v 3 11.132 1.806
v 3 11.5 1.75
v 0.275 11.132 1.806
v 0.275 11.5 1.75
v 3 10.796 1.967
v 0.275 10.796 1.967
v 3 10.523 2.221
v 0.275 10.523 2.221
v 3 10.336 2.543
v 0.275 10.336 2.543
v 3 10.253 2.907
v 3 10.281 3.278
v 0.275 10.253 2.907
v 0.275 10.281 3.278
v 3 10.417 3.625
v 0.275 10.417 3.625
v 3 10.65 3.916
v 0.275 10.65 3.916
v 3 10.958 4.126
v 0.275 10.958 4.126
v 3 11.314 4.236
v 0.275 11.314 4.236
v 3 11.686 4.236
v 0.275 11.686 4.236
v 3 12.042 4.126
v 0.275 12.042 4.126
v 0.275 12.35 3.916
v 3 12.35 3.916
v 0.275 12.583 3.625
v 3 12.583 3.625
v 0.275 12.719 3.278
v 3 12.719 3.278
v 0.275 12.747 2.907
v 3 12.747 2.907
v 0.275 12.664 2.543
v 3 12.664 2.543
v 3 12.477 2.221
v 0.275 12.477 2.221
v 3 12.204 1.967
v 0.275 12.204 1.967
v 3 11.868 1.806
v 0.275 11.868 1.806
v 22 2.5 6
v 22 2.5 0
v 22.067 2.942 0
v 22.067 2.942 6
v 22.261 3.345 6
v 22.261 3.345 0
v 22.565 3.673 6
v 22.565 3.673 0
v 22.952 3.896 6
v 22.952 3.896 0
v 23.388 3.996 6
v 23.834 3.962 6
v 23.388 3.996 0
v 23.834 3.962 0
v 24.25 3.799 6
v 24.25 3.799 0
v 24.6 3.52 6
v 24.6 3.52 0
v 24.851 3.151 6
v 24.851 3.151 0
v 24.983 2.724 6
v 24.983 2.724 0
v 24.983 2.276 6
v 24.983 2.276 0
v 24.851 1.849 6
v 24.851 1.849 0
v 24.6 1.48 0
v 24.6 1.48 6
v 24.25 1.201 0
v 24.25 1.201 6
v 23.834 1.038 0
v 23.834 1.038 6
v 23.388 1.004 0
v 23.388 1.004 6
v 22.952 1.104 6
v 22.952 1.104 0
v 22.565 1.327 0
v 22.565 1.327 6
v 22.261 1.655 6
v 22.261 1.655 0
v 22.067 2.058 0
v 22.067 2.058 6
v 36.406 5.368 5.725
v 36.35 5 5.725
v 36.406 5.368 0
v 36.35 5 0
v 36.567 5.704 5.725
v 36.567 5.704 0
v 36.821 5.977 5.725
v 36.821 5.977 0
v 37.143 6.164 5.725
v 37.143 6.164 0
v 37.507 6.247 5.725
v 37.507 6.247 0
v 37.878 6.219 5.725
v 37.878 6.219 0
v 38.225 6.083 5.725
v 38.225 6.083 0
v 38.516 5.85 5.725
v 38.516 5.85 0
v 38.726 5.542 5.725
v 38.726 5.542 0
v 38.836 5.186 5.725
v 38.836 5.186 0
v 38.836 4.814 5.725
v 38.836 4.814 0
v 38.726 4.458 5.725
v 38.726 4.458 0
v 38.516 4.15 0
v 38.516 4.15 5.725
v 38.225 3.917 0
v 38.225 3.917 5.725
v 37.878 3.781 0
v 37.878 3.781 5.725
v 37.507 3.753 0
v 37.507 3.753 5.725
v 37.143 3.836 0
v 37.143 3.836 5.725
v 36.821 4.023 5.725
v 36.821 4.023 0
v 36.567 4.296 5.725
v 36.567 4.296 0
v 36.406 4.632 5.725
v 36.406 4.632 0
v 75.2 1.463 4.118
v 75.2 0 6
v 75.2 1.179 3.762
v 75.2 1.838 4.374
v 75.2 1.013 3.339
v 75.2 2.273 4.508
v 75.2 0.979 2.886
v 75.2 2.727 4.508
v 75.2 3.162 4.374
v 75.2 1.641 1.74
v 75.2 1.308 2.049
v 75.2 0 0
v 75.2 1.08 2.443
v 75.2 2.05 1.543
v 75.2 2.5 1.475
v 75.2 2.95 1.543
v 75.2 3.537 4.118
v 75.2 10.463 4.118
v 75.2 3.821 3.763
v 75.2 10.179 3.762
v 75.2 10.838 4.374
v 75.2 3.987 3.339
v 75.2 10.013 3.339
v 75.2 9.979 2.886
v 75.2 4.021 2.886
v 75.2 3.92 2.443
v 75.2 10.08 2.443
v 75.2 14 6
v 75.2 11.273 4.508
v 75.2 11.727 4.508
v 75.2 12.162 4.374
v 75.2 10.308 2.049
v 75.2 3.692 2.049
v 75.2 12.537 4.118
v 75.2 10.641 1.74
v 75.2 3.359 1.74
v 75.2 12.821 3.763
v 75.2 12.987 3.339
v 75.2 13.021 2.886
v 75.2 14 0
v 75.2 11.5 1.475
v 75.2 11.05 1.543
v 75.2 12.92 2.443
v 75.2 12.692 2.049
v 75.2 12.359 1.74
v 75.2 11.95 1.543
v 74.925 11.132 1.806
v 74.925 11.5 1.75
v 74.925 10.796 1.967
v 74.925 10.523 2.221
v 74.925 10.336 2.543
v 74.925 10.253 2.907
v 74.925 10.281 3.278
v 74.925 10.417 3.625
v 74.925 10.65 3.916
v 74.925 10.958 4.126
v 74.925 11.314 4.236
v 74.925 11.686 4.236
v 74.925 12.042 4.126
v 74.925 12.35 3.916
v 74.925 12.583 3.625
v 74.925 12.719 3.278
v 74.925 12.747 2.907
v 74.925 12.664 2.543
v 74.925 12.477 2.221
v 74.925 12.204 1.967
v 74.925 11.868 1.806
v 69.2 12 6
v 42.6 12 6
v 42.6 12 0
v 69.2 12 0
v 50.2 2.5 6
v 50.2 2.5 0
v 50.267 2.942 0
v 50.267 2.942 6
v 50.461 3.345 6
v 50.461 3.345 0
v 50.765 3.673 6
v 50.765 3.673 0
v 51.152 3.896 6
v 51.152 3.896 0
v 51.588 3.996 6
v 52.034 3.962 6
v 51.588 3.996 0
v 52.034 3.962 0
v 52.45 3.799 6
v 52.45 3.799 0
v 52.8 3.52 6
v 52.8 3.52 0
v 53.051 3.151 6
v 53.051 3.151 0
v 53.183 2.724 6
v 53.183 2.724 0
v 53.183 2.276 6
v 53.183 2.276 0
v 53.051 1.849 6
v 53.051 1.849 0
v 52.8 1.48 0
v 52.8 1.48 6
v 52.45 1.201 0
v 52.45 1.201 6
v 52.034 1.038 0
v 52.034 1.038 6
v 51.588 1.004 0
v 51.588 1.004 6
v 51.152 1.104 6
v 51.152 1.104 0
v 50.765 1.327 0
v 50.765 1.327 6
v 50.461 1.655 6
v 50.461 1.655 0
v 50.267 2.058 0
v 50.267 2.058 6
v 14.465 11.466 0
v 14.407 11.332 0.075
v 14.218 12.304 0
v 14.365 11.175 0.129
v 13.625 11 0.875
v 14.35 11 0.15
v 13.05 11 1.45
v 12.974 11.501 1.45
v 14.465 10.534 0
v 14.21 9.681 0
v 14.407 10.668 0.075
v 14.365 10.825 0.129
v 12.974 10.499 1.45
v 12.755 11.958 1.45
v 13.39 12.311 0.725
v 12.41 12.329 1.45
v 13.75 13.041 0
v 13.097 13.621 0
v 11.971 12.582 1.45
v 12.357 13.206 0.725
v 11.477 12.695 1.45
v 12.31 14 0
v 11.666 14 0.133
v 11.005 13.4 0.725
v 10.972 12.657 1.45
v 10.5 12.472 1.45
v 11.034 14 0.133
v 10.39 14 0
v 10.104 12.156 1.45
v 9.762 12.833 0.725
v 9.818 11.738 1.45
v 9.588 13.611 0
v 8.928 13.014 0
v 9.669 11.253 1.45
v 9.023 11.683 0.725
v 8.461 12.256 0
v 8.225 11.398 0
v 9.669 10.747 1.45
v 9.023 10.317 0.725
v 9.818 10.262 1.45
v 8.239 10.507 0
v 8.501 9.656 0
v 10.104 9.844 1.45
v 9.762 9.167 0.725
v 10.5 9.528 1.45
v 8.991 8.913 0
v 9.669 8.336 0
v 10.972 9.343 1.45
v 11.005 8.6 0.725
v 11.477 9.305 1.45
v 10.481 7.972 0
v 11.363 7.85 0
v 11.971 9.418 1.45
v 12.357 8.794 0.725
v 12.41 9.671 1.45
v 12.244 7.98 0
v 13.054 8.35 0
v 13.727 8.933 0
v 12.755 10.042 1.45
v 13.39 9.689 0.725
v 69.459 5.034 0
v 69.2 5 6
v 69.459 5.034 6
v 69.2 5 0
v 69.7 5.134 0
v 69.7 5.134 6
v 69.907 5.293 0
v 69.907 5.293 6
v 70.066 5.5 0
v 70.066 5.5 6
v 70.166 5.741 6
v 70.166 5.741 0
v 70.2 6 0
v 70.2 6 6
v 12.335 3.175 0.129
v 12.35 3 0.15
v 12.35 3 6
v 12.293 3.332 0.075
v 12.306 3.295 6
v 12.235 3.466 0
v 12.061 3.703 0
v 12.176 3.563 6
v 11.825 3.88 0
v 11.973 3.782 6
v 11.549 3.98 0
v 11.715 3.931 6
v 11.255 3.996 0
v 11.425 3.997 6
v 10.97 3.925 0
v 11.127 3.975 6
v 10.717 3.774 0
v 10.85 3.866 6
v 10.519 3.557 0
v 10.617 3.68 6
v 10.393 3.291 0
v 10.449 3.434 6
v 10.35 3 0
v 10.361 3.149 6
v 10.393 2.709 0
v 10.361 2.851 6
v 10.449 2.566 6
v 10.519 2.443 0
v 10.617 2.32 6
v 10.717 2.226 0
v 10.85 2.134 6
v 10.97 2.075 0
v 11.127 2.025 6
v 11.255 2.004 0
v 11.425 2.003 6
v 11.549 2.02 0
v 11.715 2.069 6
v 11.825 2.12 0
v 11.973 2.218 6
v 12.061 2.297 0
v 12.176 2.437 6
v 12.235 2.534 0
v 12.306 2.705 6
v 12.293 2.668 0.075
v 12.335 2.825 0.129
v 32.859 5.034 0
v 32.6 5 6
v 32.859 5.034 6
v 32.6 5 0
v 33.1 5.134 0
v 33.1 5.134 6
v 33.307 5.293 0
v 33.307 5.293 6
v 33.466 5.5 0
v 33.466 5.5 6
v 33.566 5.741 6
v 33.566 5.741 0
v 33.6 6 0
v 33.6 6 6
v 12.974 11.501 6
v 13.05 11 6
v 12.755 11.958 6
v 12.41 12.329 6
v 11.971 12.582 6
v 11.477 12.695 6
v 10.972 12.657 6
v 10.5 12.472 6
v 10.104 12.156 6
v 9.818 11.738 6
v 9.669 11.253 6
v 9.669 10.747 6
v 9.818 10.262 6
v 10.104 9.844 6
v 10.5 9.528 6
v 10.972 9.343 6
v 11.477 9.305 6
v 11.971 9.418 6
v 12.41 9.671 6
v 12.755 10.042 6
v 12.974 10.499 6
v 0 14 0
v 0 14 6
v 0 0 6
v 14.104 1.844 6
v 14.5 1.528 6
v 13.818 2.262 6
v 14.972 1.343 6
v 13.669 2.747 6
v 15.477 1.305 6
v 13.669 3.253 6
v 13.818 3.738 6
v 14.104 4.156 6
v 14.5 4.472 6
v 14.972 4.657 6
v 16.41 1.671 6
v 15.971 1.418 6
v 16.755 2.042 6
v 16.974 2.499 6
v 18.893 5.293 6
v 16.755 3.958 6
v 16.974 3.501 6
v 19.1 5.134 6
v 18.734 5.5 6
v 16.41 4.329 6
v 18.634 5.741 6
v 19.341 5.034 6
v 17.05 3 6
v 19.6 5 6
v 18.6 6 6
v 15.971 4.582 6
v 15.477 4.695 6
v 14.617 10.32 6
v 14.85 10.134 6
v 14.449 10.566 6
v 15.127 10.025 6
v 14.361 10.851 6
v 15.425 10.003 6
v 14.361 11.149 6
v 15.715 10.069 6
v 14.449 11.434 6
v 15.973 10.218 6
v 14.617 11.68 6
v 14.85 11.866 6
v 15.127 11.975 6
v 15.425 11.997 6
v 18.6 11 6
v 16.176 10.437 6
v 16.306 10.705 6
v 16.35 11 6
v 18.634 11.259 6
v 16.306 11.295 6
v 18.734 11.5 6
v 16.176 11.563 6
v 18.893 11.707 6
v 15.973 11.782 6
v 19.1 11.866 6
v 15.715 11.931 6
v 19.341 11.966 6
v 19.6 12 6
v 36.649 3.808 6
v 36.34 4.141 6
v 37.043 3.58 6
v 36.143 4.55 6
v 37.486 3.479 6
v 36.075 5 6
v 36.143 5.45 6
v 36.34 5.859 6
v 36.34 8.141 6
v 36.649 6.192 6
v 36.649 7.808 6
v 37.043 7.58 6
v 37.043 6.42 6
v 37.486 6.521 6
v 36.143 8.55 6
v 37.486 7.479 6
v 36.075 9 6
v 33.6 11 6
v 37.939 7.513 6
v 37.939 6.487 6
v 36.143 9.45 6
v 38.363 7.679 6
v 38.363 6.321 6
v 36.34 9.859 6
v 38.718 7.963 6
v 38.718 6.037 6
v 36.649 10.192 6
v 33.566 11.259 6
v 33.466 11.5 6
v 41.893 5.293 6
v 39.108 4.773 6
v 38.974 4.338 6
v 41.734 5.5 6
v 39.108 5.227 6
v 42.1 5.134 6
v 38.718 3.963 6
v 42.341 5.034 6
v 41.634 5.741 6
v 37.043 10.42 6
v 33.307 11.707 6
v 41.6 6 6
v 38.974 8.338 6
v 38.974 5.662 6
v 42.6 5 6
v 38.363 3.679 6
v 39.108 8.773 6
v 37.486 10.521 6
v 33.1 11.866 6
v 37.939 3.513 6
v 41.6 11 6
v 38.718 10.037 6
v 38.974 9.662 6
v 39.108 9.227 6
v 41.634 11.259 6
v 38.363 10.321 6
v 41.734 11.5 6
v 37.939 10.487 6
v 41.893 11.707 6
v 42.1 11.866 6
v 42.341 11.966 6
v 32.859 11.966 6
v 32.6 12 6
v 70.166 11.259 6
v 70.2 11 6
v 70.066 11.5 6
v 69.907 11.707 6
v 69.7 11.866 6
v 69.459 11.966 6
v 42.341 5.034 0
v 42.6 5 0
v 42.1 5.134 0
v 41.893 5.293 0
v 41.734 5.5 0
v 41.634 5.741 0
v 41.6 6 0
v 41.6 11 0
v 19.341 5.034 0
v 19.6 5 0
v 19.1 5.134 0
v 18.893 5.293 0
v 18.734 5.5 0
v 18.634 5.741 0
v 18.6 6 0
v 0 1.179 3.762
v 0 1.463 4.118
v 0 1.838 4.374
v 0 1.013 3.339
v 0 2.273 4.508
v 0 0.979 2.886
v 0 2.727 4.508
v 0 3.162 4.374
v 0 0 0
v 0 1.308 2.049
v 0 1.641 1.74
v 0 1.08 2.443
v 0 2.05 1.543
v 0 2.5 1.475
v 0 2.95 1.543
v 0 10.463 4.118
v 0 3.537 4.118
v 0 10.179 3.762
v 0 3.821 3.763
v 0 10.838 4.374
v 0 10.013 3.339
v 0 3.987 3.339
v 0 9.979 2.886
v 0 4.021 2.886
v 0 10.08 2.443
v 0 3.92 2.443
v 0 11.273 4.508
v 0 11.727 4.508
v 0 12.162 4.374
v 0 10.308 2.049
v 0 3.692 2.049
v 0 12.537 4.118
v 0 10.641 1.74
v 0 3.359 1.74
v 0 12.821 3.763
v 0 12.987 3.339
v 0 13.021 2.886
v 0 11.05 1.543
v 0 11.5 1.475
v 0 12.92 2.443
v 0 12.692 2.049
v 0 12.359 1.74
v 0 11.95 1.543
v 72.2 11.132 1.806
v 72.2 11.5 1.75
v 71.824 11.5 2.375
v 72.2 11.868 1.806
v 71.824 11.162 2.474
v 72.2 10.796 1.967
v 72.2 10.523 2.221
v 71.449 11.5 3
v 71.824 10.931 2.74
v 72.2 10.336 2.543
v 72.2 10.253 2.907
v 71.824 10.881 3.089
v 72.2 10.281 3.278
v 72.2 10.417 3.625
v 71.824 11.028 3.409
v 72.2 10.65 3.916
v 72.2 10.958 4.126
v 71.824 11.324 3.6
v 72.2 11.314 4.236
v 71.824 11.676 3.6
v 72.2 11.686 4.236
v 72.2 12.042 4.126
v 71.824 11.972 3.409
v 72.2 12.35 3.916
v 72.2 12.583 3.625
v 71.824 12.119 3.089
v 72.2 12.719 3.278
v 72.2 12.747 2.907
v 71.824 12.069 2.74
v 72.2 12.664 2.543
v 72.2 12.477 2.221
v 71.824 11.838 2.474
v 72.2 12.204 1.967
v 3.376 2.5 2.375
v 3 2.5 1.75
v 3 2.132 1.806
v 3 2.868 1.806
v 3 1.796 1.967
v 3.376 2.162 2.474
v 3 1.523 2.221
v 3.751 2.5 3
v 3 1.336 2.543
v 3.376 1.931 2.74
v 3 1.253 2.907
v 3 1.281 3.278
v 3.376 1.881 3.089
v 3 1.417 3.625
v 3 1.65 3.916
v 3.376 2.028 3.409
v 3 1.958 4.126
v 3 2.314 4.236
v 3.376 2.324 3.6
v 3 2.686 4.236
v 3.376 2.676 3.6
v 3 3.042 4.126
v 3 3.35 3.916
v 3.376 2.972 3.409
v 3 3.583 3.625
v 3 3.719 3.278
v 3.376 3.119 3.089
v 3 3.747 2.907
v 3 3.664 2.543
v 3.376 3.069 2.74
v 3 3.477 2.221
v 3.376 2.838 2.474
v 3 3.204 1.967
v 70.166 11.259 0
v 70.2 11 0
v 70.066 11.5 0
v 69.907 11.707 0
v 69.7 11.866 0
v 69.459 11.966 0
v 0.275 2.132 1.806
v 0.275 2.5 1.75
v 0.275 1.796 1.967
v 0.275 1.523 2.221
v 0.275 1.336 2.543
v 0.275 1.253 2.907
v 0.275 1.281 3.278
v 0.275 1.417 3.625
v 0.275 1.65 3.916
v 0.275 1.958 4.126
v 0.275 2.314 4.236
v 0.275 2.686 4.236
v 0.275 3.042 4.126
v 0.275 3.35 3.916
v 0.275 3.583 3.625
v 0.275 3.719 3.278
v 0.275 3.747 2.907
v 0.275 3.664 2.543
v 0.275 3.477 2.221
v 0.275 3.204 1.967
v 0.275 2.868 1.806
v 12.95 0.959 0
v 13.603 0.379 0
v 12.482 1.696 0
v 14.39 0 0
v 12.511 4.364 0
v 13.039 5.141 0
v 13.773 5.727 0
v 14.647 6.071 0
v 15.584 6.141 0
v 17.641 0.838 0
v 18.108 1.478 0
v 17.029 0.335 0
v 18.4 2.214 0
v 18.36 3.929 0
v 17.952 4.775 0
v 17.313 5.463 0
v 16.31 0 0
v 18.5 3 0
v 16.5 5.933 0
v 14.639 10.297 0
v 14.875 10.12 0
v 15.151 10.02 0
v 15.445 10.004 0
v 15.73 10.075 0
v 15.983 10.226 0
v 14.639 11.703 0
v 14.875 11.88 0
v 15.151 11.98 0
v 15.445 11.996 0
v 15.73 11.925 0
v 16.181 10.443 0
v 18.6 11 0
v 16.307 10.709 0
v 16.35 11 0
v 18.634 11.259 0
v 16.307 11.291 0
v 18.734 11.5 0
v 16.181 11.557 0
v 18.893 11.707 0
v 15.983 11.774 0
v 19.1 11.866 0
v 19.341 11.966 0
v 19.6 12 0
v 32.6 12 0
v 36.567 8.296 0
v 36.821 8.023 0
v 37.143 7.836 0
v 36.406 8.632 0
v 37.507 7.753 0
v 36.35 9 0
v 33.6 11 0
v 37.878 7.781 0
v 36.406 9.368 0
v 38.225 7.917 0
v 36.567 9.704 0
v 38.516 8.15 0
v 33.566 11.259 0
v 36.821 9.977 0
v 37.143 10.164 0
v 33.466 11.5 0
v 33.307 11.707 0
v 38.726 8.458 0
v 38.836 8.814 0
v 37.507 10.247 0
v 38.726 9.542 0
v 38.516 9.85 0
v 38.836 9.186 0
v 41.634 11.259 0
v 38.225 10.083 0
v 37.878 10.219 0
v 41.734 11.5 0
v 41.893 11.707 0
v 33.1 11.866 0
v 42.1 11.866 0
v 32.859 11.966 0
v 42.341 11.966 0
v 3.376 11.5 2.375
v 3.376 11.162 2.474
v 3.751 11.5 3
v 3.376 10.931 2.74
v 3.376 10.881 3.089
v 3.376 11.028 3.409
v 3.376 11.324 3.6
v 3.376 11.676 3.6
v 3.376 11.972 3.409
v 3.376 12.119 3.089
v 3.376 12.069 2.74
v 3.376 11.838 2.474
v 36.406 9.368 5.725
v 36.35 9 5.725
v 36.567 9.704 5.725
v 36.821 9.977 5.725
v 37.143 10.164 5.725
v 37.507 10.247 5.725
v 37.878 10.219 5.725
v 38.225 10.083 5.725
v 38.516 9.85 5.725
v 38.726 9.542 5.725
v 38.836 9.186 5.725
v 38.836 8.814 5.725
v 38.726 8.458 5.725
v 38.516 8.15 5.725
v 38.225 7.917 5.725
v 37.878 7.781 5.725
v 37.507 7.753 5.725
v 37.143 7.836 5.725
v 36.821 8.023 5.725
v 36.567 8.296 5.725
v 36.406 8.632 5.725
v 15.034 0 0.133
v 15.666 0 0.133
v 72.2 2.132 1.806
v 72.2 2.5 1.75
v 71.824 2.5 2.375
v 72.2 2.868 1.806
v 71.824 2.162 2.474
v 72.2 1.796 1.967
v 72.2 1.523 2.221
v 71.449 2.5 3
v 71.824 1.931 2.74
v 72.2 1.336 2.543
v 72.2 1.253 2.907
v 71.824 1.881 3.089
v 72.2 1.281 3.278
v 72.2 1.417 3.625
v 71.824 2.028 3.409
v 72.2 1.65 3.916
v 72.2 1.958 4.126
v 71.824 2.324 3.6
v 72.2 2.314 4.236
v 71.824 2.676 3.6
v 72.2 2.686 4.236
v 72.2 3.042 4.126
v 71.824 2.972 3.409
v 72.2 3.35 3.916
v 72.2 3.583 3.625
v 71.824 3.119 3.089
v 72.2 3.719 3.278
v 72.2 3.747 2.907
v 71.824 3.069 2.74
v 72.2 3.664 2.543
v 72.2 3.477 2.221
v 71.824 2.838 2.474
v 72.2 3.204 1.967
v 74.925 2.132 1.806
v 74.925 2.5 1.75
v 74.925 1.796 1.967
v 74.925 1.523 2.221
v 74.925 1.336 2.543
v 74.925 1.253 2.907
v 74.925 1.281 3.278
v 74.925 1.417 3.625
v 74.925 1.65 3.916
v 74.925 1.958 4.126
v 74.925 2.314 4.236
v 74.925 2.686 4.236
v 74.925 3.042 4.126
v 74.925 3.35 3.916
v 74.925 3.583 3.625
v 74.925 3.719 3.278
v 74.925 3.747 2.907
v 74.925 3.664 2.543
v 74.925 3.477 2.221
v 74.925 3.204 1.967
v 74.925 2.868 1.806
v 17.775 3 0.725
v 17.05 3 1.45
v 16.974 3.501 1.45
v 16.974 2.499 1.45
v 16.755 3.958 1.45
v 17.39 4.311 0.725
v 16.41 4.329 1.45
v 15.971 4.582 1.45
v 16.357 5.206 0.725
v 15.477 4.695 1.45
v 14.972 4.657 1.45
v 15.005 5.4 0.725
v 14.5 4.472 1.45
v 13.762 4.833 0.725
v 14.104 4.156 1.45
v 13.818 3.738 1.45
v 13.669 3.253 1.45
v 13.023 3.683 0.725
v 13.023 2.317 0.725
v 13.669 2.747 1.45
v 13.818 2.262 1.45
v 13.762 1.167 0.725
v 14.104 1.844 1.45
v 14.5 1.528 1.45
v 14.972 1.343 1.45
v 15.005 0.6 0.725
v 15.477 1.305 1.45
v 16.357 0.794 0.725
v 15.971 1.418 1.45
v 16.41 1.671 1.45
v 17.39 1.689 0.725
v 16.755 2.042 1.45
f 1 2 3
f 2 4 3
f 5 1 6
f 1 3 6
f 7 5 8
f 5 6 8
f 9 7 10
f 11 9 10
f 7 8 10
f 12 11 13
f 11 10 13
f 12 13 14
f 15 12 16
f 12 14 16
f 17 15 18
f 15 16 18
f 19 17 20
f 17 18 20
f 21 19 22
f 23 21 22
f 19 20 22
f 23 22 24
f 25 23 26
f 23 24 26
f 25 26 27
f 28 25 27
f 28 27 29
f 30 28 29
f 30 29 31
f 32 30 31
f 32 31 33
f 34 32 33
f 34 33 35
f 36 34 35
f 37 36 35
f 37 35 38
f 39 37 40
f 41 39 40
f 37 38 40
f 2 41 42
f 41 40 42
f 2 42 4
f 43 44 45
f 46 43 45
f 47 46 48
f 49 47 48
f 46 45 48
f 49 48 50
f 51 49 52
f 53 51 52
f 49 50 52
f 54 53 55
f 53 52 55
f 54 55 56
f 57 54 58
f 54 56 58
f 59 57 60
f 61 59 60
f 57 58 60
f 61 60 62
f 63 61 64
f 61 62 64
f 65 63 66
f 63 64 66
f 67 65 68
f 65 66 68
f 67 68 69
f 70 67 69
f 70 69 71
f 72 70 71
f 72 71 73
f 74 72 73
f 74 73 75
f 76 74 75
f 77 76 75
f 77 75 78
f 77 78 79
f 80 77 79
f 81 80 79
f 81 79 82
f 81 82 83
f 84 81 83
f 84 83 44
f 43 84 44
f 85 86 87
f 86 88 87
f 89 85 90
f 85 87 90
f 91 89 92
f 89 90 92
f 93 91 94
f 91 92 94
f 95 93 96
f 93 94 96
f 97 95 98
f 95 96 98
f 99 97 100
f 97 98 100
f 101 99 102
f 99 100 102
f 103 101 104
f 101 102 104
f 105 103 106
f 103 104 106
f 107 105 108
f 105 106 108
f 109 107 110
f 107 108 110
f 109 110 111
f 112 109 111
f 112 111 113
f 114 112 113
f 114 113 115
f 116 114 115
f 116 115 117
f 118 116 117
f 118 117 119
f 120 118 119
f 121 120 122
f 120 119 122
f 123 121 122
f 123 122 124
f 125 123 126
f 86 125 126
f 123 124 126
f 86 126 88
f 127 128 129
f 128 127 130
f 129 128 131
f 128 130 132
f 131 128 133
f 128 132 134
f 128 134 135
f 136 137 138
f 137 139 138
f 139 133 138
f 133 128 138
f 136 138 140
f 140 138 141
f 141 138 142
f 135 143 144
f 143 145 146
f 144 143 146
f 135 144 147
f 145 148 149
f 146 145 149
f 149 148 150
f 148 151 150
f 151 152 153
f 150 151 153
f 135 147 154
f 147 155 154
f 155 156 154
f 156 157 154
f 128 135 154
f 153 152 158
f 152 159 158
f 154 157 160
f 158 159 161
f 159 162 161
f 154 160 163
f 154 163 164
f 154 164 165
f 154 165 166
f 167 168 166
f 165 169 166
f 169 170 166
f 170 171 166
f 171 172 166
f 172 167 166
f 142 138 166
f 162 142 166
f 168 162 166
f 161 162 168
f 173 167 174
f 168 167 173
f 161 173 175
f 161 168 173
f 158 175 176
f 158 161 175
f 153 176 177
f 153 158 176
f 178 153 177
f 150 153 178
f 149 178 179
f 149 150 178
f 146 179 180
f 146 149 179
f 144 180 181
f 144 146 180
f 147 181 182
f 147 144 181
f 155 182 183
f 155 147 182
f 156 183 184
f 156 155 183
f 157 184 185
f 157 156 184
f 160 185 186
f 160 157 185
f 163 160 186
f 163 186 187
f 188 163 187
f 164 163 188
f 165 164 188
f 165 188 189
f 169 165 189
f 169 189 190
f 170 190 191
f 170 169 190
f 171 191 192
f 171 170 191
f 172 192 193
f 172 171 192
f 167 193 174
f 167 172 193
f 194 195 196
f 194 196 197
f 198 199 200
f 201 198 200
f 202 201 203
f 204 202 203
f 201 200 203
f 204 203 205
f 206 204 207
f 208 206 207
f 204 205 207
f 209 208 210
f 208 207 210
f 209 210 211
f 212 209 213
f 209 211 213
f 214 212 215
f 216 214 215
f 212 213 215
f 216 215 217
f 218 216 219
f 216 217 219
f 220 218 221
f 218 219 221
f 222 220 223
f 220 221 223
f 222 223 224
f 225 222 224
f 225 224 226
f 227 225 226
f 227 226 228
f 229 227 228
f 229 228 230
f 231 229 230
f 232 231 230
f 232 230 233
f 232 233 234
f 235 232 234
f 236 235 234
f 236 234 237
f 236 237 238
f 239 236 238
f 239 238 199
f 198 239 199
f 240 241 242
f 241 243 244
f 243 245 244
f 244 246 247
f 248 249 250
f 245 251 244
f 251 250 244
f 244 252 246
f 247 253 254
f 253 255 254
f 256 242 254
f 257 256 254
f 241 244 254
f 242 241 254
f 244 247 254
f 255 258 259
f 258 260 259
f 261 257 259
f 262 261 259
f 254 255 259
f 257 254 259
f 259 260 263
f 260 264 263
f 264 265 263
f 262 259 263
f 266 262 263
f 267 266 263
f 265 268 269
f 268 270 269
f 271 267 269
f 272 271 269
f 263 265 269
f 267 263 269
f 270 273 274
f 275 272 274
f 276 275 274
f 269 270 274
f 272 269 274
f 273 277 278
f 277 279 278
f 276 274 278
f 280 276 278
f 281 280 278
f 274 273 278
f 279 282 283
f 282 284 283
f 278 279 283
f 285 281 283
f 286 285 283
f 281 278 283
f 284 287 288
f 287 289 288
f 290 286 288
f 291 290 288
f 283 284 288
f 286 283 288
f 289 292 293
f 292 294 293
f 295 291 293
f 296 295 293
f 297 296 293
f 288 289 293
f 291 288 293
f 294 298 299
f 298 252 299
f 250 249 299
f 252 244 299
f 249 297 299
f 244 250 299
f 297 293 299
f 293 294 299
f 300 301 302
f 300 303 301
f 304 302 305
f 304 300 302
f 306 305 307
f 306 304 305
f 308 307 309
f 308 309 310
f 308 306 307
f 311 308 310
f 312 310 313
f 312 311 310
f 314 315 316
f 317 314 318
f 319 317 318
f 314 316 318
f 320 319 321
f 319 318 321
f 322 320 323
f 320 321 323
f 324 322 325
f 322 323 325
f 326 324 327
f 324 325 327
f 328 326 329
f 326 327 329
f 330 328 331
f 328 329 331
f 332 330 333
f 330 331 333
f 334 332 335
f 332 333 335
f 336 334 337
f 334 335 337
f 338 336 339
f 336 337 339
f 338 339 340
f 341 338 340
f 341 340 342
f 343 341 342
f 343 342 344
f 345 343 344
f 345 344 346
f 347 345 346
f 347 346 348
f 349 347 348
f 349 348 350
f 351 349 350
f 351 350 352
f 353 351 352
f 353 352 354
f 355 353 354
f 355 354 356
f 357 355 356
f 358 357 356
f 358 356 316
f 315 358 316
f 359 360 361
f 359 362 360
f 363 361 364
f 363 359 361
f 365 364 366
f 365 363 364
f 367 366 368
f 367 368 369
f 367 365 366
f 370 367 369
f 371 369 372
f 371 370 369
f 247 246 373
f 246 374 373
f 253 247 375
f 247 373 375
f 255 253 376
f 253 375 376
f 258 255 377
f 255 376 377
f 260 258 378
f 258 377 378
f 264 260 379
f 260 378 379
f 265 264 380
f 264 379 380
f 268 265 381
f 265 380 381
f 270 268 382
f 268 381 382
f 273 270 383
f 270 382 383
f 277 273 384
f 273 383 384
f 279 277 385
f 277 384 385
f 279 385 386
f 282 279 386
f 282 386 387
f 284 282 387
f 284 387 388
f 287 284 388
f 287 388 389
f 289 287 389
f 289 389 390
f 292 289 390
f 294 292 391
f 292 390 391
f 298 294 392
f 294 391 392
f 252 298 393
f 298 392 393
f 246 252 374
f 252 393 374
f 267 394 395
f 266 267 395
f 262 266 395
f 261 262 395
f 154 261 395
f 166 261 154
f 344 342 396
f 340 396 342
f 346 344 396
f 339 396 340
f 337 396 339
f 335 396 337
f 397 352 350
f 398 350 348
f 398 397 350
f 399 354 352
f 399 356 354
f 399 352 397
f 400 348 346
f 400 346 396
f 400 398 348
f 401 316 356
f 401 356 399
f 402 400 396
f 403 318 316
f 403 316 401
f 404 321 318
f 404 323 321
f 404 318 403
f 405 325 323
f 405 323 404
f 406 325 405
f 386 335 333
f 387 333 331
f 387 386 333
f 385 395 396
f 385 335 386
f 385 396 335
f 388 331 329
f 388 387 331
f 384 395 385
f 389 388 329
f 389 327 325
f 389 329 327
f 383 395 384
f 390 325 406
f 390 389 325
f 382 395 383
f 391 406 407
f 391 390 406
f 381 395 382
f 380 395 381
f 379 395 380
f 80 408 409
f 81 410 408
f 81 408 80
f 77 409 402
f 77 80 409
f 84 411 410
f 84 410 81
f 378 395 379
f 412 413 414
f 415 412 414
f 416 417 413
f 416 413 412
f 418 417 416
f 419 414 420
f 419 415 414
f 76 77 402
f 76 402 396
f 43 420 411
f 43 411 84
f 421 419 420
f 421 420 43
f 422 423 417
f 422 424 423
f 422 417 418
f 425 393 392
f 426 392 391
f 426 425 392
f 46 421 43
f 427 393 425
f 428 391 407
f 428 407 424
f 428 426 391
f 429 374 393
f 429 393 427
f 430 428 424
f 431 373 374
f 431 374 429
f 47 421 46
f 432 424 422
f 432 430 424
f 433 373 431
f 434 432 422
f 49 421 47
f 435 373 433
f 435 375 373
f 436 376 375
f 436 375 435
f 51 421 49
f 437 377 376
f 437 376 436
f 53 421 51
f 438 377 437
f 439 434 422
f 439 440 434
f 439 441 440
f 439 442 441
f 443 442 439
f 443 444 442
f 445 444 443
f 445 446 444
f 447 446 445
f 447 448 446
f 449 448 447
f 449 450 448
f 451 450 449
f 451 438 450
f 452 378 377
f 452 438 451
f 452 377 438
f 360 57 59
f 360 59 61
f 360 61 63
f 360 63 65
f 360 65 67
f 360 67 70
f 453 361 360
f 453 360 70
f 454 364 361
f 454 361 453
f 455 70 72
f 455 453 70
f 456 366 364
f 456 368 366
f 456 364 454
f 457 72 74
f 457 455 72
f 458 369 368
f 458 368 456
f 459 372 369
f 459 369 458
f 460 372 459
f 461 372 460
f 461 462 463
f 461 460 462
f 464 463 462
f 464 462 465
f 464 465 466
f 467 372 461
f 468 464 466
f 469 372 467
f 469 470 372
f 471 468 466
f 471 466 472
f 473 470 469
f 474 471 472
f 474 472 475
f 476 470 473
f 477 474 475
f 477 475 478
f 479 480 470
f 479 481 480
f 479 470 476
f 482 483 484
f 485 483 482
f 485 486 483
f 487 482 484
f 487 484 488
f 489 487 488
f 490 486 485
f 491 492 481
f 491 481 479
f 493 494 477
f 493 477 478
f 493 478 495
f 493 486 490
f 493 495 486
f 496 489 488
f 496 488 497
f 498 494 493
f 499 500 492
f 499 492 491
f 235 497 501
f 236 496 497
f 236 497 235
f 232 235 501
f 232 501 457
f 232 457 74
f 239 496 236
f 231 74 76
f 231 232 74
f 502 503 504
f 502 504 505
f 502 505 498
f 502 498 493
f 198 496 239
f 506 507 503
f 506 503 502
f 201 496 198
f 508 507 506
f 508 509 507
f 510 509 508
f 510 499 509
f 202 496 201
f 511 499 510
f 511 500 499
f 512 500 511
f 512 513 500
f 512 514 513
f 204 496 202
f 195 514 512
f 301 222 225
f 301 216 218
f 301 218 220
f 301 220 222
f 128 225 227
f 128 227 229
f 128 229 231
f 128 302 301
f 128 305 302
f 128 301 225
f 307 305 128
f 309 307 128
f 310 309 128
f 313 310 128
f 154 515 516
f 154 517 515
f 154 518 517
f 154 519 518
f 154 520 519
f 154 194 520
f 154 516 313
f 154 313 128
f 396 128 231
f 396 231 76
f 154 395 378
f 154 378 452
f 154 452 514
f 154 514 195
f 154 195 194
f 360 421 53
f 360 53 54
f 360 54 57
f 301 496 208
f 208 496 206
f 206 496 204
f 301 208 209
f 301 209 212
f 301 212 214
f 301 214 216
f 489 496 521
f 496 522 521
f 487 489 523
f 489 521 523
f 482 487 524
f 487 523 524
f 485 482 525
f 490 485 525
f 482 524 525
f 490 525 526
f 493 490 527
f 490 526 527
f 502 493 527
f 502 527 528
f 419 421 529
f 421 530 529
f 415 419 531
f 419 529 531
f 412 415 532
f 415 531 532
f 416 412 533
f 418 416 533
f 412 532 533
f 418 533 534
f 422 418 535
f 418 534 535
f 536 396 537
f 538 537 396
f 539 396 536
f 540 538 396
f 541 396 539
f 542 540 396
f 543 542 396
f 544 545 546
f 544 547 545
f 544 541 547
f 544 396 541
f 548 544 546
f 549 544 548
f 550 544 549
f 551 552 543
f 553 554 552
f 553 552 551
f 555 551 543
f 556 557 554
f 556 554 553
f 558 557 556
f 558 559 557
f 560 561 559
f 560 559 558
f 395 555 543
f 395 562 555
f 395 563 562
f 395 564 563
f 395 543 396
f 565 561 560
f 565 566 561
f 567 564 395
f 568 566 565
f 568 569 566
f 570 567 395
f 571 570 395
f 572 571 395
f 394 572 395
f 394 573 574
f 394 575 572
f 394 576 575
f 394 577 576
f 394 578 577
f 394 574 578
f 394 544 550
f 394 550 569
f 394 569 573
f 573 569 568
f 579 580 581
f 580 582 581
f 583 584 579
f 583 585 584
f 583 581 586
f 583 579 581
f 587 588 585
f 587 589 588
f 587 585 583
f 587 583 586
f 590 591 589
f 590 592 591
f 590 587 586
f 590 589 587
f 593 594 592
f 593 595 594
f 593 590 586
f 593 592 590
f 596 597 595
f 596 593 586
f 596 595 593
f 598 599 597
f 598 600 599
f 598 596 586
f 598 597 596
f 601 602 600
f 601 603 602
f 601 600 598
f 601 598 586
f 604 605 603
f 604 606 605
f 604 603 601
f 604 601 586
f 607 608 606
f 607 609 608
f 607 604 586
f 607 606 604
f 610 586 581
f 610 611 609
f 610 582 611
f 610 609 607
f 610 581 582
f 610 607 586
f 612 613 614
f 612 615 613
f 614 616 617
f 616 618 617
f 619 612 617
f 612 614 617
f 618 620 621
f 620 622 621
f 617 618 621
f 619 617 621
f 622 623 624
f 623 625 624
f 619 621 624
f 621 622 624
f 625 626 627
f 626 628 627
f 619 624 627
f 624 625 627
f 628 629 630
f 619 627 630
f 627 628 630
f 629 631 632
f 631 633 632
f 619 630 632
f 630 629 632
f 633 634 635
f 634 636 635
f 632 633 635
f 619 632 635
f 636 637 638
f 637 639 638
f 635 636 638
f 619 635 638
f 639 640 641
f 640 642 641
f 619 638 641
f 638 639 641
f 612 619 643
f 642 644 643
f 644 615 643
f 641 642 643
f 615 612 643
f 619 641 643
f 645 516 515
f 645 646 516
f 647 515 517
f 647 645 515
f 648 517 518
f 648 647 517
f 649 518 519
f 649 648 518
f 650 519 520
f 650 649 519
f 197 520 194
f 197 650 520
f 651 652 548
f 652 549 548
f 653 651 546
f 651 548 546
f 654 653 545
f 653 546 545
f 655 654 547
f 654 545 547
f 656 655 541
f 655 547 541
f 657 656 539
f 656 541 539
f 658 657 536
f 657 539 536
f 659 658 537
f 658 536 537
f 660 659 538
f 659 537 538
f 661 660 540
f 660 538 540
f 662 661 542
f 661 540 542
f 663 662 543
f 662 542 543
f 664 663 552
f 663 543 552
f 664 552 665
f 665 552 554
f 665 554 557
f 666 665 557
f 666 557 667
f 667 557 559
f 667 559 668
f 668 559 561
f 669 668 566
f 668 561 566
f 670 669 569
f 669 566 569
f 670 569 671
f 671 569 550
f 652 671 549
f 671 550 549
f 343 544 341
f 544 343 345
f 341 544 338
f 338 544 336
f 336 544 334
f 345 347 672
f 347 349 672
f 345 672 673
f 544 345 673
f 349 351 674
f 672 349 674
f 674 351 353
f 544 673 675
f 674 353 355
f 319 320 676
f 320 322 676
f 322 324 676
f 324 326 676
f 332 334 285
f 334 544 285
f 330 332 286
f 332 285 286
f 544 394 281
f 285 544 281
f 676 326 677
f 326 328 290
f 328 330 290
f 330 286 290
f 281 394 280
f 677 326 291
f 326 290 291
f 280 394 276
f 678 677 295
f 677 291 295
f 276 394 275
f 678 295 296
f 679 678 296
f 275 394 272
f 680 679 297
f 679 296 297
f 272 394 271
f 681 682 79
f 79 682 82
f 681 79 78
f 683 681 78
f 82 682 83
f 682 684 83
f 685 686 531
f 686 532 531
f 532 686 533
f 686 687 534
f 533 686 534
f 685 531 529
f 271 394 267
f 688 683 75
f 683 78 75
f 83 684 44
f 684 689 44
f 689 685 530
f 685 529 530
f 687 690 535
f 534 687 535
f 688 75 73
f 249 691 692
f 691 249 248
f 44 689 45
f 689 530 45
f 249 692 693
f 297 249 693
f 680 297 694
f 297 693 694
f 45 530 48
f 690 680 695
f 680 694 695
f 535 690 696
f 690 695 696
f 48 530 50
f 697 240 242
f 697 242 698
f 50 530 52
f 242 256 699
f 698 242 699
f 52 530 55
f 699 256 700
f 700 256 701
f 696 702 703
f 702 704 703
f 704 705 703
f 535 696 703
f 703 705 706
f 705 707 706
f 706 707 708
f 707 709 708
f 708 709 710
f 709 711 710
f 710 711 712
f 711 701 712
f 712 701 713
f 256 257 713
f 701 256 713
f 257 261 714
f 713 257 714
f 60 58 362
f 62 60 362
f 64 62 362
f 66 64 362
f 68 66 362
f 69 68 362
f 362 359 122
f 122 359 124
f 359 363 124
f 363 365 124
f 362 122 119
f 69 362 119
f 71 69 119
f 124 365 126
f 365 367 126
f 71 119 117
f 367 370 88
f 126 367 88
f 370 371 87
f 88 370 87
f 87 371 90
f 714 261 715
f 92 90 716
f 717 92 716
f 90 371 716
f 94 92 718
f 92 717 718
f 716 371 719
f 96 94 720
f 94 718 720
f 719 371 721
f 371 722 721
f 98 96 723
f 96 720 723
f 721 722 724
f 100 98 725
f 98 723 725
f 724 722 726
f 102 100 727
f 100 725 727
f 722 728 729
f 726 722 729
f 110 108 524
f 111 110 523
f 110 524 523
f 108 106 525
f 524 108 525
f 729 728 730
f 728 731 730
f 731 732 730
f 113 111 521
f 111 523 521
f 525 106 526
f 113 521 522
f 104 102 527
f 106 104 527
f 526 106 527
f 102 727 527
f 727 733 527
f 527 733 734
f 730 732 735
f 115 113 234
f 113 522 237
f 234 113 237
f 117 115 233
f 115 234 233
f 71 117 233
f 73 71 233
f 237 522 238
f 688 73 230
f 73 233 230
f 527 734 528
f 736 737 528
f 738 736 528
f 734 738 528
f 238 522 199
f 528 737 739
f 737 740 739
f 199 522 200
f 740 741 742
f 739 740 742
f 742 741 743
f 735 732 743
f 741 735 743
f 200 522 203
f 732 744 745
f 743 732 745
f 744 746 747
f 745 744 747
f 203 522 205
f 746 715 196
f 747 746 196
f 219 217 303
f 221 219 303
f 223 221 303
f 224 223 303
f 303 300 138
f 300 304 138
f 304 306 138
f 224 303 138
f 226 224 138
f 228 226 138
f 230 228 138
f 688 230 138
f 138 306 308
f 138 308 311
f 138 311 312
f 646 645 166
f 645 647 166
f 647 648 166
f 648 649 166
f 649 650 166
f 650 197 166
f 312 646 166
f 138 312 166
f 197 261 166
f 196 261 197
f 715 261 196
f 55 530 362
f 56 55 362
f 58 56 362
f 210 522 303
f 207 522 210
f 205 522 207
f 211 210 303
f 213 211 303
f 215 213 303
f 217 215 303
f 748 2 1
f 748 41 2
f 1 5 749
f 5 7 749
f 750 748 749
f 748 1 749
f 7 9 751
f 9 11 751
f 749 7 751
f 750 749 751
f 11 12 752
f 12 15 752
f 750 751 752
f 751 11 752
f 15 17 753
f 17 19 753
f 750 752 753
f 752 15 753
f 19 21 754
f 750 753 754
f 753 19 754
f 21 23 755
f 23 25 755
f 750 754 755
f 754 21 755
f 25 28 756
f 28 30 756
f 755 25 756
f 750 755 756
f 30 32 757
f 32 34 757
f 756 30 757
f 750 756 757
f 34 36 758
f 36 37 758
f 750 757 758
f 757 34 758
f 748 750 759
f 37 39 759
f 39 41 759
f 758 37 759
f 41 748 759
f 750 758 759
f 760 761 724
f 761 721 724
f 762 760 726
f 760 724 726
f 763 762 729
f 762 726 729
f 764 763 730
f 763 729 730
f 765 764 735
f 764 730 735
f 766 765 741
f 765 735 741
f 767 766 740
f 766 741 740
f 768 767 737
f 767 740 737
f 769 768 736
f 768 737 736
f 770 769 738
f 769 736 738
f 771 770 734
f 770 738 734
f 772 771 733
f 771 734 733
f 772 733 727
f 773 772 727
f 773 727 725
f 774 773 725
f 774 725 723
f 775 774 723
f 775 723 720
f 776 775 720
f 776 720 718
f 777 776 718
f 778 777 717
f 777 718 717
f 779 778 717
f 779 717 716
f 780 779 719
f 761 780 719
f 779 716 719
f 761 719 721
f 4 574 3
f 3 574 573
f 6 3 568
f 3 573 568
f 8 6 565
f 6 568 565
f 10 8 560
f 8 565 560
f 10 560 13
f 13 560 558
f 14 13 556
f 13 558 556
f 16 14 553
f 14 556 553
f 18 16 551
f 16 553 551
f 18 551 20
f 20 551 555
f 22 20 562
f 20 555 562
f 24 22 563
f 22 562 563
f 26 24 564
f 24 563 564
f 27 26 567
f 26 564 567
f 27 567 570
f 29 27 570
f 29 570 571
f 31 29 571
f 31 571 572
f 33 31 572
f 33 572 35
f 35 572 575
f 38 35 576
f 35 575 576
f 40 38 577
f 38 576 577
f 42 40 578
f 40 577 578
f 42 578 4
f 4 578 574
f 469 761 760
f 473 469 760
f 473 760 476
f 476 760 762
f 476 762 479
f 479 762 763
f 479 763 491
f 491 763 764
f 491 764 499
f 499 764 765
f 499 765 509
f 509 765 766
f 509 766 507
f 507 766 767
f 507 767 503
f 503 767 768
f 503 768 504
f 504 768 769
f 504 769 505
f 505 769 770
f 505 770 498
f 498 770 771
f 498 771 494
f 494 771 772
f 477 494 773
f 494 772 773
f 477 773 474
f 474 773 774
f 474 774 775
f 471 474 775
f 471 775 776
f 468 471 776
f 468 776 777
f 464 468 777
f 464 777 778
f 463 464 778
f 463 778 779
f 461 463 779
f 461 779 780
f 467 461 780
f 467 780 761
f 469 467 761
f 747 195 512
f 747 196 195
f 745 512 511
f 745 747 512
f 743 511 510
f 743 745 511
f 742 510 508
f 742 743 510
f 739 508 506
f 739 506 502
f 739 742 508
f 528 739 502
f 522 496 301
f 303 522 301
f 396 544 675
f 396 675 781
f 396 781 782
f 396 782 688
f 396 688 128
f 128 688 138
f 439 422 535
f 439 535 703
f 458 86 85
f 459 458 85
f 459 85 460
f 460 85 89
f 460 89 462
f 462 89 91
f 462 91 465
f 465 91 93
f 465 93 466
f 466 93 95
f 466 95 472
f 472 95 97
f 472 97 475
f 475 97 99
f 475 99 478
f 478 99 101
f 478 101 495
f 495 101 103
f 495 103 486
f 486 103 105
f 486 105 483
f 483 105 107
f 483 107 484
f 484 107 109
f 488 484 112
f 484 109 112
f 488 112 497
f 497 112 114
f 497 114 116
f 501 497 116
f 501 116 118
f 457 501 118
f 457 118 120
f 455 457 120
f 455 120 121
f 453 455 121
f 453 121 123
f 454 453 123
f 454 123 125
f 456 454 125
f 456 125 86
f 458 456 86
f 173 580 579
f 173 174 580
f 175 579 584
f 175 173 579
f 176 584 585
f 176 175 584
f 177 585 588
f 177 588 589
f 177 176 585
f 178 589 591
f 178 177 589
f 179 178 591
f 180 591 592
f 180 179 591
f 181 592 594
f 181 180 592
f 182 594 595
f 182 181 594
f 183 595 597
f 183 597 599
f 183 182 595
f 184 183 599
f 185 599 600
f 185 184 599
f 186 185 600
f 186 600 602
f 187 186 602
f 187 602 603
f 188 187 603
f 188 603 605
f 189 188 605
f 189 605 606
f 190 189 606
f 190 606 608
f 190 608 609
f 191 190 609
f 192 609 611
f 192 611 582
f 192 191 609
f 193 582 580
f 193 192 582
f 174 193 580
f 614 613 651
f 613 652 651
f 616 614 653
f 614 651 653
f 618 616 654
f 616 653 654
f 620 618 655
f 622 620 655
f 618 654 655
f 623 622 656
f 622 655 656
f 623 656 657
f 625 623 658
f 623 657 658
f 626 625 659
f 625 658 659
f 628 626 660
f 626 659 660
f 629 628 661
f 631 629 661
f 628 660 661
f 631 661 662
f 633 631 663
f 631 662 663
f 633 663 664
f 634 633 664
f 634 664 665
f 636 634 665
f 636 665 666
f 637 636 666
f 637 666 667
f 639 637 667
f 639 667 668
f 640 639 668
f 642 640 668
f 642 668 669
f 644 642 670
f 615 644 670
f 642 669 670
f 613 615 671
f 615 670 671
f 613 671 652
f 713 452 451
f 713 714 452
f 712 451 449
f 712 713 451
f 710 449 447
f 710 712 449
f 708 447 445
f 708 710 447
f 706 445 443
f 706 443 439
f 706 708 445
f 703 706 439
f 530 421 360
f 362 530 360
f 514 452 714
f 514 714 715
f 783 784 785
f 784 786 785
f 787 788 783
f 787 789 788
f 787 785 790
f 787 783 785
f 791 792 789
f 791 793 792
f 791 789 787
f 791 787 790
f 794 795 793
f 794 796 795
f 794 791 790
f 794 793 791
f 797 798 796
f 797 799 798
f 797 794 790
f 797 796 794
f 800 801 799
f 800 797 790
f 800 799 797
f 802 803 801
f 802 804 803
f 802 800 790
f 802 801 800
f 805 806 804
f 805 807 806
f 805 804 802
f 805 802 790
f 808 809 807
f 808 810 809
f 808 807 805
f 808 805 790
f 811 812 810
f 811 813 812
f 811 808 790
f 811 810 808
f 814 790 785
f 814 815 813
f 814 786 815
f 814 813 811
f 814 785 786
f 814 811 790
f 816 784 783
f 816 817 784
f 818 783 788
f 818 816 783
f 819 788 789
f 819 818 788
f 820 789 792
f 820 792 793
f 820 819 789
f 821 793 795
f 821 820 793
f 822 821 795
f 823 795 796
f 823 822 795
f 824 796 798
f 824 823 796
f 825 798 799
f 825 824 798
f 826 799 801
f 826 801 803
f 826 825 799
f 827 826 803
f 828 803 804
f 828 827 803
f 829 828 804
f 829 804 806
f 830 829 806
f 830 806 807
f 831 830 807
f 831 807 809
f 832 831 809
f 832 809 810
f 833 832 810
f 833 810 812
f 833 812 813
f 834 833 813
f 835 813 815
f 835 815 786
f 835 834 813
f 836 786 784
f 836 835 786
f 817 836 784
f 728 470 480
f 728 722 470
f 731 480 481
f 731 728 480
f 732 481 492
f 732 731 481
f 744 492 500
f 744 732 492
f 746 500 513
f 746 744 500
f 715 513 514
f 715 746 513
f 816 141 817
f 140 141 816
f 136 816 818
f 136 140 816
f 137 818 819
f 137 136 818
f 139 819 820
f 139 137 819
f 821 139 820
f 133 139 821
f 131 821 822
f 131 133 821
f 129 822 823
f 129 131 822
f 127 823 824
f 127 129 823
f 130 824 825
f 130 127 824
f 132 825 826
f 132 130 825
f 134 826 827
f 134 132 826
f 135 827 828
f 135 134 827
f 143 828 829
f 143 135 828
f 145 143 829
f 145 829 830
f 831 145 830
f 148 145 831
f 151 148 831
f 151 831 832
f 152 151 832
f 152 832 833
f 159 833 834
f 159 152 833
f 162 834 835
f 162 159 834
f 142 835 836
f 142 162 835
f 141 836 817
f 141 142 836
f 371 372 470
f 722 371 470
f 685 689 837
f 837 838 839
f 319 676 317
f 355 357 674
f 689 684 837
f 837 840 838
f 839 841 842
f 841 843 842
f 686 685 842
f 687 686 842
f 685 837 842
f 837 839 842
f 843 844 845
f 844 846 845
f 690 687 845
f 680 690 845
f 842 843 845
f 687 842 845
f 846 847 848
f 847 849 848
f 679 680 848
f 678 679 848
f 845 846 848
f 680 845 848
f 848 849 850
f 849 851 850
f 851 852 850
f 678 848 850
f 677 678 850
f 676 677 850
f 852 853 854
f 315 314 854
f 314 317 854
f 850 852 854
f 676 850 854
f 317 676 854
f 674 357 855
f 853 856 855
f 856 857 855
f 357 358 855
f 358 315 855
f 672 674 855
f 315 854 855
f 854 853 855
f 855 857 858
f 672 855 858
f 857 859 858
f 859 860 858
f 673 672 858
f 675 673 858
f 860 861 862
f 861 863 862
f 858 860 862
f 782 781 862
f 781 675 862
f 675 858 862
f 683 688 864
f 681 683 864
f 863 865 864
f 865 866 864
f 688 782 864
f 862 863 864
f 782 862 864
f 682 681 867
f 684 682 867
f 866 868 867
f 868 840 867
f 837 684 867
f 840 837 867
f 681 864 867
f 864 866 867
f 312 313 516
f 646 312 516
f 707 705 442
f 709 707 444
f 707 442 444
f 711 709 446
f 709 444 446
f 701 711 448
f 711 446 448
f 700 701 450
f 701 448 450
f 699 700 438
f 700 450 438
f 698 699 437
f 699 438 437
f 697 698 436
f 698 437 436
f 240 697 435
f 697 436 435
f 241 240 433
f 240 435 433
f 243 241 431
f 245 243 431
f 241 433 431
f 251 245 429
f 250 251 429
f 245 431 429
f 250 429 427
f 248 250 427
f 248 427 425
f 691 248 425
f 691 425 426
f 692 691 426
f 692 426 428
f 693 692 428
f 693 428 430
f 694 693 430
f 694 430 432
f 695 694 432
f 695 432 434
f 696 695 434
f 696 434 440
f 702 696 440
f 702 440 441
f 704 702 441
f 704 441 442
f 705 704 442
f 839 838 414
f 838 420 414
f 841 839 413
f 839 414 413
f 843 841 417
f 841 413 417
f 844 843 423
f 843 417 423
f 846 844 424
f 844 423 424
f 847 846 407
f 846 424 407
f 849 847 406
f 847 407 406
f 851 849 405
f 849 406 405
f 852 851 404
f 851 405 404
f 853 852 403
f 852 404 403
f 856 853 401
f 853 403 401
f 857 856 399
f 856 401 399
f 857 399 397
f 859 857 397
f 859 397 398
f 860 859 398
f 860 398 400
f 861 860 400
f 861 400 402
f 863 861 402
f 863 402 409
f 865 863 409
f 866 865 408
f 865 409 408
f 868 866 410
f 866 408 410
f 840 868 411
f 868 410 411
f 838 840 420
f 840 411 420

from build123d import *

# Parameters (mm, degrees)
SKETCH1_W                                       = 75.2
SKETCH1_H                                       = 14
BOSS_EXTRUDE1_DEPTH                             = 6
SKETCH2_W                                       = 15
SKETCH2_H                                       = 7
SKETCH2_W_2                                     = 28.6
CUT_EXTRUDE1_DEPTH                              = 7
FILLET1_R                                       = 1
F_3_0_3_DIAMETER_HOLE1_D                        = 3
F_3_0_3_DIAMETER_HOLE1_DEPTH                    = 45
F_3_0_3_DIAMETER_HOLE1_TIP                      = 0.901290929
CSK_FOR_M3_FLAT_HEAD_MACHINE_SCREW1_D           = 3.4
CSK_FOR_M3_FLAT_HEAD_MACHINE_SCREW1_CSINK_D     = 6.3
CSK_FOR_M3_FLAT_HEAD_MACHINE_SCREW1_CSINK_ANGLE = 90
F_2_0_2_DIAMETER_HOLE1_D                        = 2
M3X0_5_TAPPED_HOLE1_AT_2_COUNT                  = 2
M3X0_5_TAPPED_HOLE1_AT_2_PITCH                  = 9
M3X0_5_TAPPED_HOLE2_D                           = 2.5
M3X0_5_TAPPED_HOLE2_CSINK_D                     = 3.05
M3X0_5_TAPPED_HOLE2_CSINK_ANGLE                 = 90


with BuildPart() as part:
    # Sketch1 → Boss-Extrude1 (new body)
    with BuildSketch(Plane.XY):
        with Locations((37.6, 7)):
            Rectangle(SKETCH1_W, SKETCH1_H)
    extrude(amount=BOSS_EXTRUDE1_DEPTH)

    # Sketch2 → Cut-Extrude1 (cut, through all)
    with BuildSketch(Plane.XY.offset(6)):
        with Locations((26.1, 8.5)):
            Rectangle(SKETCH2_W, SKETCH2_H)
        with Locations((55.9, 8.5)):
            Rectangle(SKETCH2_W_2, SKETCH2_H)
    extrude(amount=-CUT_EXTRUDE1_DEPTH, mode=Mode.SUBTRACT)

    # Fillet1
    fillet1_edges = [part.edges().sort_by_distance(p)[0] for p in [
        (18.6, 5, 3),
        (18.6, 12, 3),
        (33.6, 12, 3),
        (33.6, 5, 3),
        (41.6, 5, 3),
        (41.6, 12, 3),
        (70.2, 12, 3),
        (70.2, 5, 3),
    ]]
    fillet(fillet1_edges, radius=FILLET1_R)

    # Ø3.0 (3) Diameter Hole1
    with Locations(Plane.XY.offset(6)):
        with Locations((23.5, 2.5), (51.7, 2.5)):
            Hole(F_3_0_3_DIAMETER_HOLE1_D / 2, depth=F_3_0_3_DIAMETER_HOLE1_DEPTH)
            with Locations((0, 0, -(F_3_0_3_DIAMETER_HOLE1_DEPTH + F_3_0_3_DIAMETER_HOLE1_TIP / 2))):  # 118° drill point
                Cone(0, F_3_0_3_DIAMETER_HOLE1_D / 2, F_3_0_3_DIAMETER_HOLE1_TIP, mode=Mode.SUBTRACT)

    # CSK for M3 Flat Head Machine Screw1 (through all)
    with Locations(Plane(origin=(0, 0, 0), x_dir=(-1, 0, 0), z_dir=(0, 0, -1))):
        with Locations((-11.35, 11), (-15.35, 3)):
            CounterSinkHole(CSK_FOR_M3_FLAT_HEAD_MACHINE_SCREW1_D / 2, CSK_FOR_M3_FLAT_HEAD_MACHINE_SCREW1_CSINK_D / 2, counter_sink_angle=CSK_FOR_M3_FLAT_HEAD_MACHINE_SCREW1_CSINK_ANGLE)

    # Ø2.0 (2) Diameter Hole1 (through all)
    with Locations(Plane(origin=(0, 0, 0), x_dir=(-1, 0, 0), z_dir=(0, 0, -1))):
        with Locations((-15.35, 11), (-11.35, 3)):
            Hole(F_2_0_2_DIAMETER_HOLE1_D / 2)

    # Sketch12 → M3x0.5 Tapped Hole1 (revolve, cut)
    with BuildSketch(Plane(origin=(75.2, 11.5, 3), x_dir=(0, 0, -1), z_dir=(0, 1, 0))):
        Polygon((0, 0), (0, 3.751075774), (1.25, 3), (1.25, 0.275), (1.525, 0), align=None)
    m3x0_5_tapped_hole1 = revolve(axis=Axis((81.55, 11.5, 3), (-1, 0, 0)), mode=Mode.SUBTRACT)

    # M3x0.5 Tapped Hole1 at 2: M3x0.5 Tapped Hole1 ×2
    with Locations(*[(0, -i * M3X0_5_TAPPED_HOLE1_AT_2_PITCH, 0) for i in range(1, M3X0_5_TAPPED_HOLE1_AT_2_COUNT)]):
        add(m3x0_5_tapped_hole1, mode=Mode.SUBTRACT)

    # Mirror1: M3x0.5 Tapped Hole1 across plane
    add(m3x0_5_tapped_hole1.mirror(Plane(origin=(37.6, 0, 0), x_dir=(0, 0, 1), z_dir=(1, 0, 0))), mode=Mode.SUBTRACT)

    # Mirror1 copy 1 sketch → Mirror1 copy 1 (revolve, cut)
    with BuildSketch(Plane(origin=(0, 2.5, 3), x_dir=(0, 0, -1), z_dir=(0, 1, 0))):
        Polygon((0, 0), (0, -3.751075774), (1.25, -3), (1.25, -0.275), (1.525, 0), align=None)
    revolve(axis=Axis((-6.35, 2.5, 3), (-1, 0, 0)), mode=Mode.SUBTRACT)

    # M3x0.5 Tapped Hole2 (through all)
    with Locations(Plane.XY.offset(6)):
        with Locations((37.6, 9), (37.6, 5)):
            CounterSinkHole(M3X0_5_TAPPED_HOLE2_D / 2, M3X0_5_TAPPED_HOLE2_CSINK_D / 2, counter_sink_angle=M3X0_5_TAPPED_HOLE2_CSINK_ANGLE)


solid = part.part
